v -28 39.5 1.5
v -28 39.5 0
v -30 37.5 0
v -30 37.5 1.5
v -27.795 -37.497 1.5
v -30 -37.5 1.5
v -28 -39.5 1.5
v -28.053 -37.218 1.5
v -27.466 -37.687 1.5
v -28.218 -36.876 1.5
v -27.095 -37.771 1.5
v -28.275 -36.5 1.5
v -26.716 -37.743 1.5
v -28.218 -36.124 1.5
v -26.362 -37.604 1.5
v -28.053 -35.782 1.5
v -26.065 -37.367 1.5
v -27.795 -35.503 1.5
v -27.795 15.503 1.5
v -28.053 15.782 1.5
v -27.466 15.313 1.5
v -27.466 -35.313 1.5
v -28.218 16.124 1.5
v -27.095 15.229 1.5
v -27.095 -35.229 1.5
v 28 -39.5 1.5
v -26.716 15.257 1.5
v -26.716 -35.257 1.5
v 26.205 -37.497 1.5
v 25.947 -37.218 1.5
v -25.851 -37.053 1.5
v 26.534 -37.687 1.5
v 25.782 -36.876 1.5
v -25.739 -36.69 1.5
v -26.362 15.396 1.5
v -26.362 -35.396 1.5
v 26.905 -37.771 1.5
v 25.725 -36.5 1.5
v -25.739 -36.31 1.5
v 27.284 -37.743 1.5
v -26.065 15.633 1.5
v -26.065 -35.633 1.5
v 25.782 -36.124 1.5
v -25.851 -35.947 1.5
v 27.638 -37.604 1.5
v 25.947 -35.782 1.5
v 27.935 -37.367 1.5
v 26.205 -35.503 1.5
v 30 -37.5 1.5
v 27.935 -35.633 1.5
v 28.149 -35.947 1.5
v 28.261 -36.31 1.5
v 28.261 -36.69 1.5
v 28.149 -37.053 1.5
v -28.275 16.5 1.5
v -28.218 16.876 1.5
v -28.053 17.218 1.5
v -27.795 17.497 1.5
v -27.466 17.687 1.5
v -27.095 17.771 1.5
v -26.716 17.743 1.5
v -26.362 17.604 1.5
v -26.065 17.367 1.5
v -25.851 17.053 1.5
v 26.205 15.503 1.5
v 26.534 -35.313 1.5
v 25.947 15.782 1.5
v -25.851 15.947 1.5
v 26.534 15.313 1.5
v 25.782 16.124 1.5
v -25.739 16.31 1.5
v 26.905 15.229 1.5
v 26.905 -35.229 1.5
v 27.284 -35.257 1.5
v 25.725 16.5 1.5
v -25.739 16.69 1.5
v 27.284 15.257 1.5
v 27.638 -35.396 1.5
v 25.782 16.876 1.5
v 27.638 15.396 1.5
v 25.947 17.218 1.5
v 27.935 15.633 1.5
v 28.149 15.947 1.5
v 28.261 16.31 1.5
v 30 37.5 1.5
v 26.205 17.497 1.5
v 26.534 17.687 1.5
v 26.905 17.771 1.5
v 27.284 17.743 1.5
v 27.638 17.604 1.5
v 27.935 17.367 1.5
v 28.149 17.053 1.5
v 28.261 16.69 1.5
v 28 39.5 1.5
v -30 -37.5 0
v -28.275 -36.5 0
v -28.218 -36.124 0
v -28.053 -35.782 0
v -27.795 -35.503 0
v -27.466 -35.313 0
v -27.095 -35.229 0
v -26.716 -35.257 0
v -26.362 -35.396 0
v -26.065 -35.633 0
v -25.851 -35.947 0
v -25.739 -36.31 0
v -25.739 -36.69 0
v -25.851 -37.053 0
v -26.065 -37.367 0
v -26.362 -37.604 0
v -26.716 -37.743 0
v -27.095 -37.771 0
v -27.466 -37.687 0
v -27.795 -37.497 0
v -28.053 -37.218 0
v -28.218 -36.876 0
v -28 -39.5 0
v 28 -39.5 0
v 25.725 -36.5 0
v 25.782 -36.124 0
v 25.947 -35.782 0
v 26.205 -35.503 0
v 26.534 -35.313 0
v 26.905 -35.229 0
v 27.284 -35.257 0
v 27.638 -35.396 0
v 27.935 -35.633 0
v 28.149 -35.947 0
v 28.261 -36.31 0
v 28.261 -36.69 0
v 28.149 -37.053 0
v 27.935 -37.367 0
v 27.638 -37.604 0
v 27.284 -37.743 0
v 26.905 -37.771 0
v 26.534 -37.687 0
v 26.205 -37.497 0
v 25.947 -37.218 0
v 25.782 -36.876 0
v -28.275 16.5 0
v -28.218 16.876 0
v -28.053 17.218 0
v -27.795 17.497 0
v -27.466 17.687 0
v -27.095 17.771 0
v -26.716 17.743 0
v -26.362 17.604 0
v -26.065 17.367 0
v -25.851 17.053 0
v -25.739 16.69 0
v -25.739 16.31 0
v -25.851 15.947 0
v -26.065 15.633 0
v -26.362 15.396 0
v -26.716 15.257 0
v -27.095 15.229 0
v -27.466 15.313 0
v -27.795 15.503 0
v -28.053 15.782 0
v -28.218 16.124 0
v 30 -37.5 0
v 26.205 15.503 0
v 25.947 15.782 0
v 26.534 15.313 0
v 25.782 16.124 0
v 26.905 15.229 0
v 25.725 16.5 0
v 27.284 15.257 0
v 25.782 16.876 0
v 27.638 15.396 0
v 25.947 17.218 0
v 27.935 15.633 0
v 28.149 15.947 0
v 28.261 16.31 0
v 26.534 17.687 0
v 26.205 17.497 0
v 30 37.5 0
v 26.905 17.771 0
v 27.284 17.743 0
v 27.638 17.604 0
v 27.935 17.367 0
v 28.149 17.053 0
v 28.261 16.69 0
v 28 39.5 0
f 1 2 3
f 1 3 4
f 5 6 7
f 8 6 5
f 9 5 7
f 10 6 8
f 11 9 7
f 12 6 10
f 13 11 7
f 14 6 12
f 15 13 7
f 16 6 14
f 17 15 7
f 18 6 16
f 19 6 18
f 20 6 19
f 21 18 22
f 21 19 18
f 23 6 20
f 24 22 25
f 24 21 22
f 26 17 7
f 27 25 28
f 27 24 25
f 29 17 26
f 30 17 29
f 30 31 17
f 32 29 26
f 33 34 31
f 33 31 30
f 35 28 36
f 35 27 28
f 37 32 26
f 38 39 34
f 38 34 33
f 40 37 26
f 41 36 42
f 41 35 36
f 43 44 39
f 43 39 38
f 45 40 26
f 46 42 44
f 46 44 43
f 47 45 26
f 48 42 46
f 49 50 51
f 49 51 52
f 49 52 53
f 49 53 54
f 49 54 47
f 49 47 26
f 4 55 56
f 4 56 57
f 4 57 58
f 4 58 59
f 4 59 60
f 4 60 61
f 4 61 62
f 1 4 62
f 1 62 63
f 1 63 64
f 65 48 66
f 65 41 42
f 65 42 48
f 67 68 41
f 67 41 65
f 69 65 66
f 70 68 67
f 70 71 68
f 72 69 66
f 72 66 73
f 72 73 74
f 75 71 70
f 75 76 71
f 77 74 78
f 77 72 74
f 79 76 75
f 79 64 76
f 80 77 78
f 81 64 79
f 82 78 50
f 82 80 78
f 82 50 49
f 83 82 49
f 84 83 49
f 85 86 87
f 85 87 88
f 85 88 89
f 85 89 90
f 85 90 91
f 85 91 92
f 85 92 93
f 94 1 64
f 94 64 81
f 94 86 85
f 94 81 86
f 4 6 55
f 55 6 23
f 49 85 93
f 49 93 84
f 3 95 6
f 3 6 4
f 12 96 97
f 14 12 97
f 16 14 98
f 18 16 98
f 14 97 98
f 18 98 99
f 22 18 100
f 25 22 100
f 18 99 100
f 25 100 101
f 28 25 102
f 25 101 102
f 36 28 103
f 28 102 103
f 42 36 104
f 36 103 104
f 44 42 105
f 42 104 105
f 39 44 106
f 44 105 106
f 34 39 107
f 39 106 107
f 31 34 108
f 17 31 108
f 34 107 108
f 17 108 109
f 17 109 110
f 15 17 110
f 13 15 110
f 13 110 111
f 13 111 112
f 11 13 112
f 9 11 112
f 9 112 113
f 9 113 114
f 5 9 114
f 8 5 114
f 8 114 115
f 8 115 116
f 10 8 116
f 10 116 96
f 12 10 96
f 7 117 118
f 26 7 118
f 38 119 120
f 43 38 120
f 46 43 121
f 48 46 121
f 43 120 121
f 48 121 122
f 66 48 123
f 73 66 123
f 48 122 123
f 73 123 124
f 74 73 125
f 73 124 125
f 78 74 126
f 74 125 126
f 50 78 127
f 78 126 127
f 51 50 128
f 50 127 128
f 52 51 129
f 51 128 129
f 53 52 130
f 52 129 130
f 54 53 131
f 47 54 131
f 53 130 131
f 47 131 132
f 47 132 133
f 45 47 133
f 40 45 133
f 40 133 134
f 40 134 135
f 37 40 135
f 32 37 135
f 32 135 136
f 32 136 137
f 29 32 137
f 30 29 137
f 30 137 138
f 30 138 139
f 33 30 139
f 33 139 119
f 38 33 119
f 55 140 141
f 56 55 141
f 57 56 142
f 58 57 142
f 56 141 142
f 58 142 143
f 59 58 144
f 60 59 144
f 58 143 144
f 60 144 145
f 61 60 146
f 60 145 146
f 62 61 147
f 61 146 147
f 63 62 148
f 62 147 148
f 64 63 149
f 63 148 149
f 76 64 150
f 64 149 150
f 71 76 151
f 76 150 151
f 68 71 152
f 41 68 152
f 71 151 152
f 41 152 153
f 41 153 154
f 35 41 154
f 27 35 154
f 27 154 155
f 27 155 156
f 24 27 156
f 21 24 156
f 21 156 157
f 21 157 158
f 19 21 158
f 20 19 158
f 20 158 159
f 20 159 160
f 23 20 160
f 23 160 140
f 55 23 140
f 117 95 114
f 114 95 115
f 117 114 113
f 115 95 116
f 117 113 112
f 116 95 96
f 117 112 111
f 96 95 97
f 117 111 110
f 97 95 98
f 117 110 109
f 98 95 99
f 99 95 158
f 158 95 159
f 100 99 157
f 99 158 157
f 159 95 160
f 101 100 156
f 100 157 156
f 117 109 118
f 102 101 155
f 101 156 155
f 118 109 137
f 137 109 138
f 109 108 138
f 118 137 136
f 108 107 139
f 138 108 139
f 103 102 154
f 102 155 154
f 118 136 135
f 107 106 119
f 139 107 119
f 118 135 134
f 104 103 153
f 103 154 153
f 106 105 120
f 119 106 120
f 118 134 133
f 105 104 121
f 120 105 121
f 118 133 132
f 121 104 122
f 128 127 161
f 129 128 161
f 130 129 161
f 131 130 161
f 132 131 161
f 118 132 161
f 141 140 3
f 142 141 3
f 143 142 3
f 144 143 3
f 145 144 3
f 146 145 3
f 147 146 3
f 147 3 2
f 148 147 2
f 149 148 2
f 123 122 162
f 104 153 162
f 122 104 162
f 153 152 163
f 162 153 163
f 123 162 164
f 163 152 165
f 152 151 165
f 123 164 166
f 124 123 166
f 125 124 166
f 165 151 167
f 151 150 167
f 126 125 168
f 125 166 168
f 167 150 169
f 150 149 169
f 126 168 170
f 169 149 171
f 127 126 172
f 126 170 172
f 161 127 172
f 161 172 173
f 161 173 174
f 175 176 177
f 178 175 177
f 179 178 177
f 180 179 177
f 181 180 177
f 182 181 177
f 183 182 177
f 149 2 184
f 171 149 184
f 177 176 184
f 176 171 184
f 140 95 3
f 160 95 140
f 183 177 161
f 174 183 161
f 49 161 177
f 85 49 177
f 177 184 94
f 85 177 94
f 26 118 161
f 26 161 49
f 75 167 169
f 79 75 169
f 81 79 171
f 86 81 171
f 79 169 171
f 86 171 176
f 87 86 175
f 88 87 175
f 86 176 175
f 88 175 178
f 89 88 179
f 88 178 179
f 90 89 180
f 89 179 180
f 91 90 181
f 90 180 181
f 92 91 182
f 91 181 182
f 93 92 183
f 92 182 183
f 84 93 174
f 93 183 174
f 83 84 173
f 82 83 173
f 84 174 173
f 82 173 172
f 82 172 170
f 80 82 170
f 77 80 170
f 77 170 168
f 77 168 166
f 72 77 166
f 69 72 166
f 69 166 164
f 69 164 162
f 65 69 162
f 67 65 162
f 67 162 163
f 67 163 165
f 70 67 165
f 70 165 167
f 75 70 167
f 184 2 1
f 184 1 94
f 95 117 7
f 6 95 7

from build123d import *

# Parameters (mm, degrees)
SKETCH_1_W          = 60
SKETCH_1_H          = 79
EXTRUDE_1_DEPTH     = 1.5
CHAMFER_1_SIZE      = 2
HOLE_WIZARD_M2_51_D = 2.55


with BuildPart() as part:
    # Эскиз1 → Бобышка-Вытянуть1 (new body)
    with BuildSketch(Plane.XY):
        Rectangle(SKETCH_1_W, SKETCH_1_H)
    extrude(amount=EXTRUDE_1_DEPTH)

    # Фаска1
    chamfer_1_edges = [part.edges().sort_by_distance(p)[0] for p in [
        (30, -39.5, 0.75),
        (-30, -39.5, 0.75),
        (-30, 39.5, 0.75),
        (30, 39.5, 0.75),
    ]]
    chamfer(chamfer_1_edges, length=CHAMFER_1_SIZE)

    # Сверло под метчик  спиральное M2.51 (through all)
    with Locations(Plane.XY.offset(1.5)):
        with Locations((-27, 16.5), (27, 16.5), (27, -36.5), (-27, -36.5)):
            Hole(HOLE_WIZARD_M2_51_D / 2)


solid = part.part
